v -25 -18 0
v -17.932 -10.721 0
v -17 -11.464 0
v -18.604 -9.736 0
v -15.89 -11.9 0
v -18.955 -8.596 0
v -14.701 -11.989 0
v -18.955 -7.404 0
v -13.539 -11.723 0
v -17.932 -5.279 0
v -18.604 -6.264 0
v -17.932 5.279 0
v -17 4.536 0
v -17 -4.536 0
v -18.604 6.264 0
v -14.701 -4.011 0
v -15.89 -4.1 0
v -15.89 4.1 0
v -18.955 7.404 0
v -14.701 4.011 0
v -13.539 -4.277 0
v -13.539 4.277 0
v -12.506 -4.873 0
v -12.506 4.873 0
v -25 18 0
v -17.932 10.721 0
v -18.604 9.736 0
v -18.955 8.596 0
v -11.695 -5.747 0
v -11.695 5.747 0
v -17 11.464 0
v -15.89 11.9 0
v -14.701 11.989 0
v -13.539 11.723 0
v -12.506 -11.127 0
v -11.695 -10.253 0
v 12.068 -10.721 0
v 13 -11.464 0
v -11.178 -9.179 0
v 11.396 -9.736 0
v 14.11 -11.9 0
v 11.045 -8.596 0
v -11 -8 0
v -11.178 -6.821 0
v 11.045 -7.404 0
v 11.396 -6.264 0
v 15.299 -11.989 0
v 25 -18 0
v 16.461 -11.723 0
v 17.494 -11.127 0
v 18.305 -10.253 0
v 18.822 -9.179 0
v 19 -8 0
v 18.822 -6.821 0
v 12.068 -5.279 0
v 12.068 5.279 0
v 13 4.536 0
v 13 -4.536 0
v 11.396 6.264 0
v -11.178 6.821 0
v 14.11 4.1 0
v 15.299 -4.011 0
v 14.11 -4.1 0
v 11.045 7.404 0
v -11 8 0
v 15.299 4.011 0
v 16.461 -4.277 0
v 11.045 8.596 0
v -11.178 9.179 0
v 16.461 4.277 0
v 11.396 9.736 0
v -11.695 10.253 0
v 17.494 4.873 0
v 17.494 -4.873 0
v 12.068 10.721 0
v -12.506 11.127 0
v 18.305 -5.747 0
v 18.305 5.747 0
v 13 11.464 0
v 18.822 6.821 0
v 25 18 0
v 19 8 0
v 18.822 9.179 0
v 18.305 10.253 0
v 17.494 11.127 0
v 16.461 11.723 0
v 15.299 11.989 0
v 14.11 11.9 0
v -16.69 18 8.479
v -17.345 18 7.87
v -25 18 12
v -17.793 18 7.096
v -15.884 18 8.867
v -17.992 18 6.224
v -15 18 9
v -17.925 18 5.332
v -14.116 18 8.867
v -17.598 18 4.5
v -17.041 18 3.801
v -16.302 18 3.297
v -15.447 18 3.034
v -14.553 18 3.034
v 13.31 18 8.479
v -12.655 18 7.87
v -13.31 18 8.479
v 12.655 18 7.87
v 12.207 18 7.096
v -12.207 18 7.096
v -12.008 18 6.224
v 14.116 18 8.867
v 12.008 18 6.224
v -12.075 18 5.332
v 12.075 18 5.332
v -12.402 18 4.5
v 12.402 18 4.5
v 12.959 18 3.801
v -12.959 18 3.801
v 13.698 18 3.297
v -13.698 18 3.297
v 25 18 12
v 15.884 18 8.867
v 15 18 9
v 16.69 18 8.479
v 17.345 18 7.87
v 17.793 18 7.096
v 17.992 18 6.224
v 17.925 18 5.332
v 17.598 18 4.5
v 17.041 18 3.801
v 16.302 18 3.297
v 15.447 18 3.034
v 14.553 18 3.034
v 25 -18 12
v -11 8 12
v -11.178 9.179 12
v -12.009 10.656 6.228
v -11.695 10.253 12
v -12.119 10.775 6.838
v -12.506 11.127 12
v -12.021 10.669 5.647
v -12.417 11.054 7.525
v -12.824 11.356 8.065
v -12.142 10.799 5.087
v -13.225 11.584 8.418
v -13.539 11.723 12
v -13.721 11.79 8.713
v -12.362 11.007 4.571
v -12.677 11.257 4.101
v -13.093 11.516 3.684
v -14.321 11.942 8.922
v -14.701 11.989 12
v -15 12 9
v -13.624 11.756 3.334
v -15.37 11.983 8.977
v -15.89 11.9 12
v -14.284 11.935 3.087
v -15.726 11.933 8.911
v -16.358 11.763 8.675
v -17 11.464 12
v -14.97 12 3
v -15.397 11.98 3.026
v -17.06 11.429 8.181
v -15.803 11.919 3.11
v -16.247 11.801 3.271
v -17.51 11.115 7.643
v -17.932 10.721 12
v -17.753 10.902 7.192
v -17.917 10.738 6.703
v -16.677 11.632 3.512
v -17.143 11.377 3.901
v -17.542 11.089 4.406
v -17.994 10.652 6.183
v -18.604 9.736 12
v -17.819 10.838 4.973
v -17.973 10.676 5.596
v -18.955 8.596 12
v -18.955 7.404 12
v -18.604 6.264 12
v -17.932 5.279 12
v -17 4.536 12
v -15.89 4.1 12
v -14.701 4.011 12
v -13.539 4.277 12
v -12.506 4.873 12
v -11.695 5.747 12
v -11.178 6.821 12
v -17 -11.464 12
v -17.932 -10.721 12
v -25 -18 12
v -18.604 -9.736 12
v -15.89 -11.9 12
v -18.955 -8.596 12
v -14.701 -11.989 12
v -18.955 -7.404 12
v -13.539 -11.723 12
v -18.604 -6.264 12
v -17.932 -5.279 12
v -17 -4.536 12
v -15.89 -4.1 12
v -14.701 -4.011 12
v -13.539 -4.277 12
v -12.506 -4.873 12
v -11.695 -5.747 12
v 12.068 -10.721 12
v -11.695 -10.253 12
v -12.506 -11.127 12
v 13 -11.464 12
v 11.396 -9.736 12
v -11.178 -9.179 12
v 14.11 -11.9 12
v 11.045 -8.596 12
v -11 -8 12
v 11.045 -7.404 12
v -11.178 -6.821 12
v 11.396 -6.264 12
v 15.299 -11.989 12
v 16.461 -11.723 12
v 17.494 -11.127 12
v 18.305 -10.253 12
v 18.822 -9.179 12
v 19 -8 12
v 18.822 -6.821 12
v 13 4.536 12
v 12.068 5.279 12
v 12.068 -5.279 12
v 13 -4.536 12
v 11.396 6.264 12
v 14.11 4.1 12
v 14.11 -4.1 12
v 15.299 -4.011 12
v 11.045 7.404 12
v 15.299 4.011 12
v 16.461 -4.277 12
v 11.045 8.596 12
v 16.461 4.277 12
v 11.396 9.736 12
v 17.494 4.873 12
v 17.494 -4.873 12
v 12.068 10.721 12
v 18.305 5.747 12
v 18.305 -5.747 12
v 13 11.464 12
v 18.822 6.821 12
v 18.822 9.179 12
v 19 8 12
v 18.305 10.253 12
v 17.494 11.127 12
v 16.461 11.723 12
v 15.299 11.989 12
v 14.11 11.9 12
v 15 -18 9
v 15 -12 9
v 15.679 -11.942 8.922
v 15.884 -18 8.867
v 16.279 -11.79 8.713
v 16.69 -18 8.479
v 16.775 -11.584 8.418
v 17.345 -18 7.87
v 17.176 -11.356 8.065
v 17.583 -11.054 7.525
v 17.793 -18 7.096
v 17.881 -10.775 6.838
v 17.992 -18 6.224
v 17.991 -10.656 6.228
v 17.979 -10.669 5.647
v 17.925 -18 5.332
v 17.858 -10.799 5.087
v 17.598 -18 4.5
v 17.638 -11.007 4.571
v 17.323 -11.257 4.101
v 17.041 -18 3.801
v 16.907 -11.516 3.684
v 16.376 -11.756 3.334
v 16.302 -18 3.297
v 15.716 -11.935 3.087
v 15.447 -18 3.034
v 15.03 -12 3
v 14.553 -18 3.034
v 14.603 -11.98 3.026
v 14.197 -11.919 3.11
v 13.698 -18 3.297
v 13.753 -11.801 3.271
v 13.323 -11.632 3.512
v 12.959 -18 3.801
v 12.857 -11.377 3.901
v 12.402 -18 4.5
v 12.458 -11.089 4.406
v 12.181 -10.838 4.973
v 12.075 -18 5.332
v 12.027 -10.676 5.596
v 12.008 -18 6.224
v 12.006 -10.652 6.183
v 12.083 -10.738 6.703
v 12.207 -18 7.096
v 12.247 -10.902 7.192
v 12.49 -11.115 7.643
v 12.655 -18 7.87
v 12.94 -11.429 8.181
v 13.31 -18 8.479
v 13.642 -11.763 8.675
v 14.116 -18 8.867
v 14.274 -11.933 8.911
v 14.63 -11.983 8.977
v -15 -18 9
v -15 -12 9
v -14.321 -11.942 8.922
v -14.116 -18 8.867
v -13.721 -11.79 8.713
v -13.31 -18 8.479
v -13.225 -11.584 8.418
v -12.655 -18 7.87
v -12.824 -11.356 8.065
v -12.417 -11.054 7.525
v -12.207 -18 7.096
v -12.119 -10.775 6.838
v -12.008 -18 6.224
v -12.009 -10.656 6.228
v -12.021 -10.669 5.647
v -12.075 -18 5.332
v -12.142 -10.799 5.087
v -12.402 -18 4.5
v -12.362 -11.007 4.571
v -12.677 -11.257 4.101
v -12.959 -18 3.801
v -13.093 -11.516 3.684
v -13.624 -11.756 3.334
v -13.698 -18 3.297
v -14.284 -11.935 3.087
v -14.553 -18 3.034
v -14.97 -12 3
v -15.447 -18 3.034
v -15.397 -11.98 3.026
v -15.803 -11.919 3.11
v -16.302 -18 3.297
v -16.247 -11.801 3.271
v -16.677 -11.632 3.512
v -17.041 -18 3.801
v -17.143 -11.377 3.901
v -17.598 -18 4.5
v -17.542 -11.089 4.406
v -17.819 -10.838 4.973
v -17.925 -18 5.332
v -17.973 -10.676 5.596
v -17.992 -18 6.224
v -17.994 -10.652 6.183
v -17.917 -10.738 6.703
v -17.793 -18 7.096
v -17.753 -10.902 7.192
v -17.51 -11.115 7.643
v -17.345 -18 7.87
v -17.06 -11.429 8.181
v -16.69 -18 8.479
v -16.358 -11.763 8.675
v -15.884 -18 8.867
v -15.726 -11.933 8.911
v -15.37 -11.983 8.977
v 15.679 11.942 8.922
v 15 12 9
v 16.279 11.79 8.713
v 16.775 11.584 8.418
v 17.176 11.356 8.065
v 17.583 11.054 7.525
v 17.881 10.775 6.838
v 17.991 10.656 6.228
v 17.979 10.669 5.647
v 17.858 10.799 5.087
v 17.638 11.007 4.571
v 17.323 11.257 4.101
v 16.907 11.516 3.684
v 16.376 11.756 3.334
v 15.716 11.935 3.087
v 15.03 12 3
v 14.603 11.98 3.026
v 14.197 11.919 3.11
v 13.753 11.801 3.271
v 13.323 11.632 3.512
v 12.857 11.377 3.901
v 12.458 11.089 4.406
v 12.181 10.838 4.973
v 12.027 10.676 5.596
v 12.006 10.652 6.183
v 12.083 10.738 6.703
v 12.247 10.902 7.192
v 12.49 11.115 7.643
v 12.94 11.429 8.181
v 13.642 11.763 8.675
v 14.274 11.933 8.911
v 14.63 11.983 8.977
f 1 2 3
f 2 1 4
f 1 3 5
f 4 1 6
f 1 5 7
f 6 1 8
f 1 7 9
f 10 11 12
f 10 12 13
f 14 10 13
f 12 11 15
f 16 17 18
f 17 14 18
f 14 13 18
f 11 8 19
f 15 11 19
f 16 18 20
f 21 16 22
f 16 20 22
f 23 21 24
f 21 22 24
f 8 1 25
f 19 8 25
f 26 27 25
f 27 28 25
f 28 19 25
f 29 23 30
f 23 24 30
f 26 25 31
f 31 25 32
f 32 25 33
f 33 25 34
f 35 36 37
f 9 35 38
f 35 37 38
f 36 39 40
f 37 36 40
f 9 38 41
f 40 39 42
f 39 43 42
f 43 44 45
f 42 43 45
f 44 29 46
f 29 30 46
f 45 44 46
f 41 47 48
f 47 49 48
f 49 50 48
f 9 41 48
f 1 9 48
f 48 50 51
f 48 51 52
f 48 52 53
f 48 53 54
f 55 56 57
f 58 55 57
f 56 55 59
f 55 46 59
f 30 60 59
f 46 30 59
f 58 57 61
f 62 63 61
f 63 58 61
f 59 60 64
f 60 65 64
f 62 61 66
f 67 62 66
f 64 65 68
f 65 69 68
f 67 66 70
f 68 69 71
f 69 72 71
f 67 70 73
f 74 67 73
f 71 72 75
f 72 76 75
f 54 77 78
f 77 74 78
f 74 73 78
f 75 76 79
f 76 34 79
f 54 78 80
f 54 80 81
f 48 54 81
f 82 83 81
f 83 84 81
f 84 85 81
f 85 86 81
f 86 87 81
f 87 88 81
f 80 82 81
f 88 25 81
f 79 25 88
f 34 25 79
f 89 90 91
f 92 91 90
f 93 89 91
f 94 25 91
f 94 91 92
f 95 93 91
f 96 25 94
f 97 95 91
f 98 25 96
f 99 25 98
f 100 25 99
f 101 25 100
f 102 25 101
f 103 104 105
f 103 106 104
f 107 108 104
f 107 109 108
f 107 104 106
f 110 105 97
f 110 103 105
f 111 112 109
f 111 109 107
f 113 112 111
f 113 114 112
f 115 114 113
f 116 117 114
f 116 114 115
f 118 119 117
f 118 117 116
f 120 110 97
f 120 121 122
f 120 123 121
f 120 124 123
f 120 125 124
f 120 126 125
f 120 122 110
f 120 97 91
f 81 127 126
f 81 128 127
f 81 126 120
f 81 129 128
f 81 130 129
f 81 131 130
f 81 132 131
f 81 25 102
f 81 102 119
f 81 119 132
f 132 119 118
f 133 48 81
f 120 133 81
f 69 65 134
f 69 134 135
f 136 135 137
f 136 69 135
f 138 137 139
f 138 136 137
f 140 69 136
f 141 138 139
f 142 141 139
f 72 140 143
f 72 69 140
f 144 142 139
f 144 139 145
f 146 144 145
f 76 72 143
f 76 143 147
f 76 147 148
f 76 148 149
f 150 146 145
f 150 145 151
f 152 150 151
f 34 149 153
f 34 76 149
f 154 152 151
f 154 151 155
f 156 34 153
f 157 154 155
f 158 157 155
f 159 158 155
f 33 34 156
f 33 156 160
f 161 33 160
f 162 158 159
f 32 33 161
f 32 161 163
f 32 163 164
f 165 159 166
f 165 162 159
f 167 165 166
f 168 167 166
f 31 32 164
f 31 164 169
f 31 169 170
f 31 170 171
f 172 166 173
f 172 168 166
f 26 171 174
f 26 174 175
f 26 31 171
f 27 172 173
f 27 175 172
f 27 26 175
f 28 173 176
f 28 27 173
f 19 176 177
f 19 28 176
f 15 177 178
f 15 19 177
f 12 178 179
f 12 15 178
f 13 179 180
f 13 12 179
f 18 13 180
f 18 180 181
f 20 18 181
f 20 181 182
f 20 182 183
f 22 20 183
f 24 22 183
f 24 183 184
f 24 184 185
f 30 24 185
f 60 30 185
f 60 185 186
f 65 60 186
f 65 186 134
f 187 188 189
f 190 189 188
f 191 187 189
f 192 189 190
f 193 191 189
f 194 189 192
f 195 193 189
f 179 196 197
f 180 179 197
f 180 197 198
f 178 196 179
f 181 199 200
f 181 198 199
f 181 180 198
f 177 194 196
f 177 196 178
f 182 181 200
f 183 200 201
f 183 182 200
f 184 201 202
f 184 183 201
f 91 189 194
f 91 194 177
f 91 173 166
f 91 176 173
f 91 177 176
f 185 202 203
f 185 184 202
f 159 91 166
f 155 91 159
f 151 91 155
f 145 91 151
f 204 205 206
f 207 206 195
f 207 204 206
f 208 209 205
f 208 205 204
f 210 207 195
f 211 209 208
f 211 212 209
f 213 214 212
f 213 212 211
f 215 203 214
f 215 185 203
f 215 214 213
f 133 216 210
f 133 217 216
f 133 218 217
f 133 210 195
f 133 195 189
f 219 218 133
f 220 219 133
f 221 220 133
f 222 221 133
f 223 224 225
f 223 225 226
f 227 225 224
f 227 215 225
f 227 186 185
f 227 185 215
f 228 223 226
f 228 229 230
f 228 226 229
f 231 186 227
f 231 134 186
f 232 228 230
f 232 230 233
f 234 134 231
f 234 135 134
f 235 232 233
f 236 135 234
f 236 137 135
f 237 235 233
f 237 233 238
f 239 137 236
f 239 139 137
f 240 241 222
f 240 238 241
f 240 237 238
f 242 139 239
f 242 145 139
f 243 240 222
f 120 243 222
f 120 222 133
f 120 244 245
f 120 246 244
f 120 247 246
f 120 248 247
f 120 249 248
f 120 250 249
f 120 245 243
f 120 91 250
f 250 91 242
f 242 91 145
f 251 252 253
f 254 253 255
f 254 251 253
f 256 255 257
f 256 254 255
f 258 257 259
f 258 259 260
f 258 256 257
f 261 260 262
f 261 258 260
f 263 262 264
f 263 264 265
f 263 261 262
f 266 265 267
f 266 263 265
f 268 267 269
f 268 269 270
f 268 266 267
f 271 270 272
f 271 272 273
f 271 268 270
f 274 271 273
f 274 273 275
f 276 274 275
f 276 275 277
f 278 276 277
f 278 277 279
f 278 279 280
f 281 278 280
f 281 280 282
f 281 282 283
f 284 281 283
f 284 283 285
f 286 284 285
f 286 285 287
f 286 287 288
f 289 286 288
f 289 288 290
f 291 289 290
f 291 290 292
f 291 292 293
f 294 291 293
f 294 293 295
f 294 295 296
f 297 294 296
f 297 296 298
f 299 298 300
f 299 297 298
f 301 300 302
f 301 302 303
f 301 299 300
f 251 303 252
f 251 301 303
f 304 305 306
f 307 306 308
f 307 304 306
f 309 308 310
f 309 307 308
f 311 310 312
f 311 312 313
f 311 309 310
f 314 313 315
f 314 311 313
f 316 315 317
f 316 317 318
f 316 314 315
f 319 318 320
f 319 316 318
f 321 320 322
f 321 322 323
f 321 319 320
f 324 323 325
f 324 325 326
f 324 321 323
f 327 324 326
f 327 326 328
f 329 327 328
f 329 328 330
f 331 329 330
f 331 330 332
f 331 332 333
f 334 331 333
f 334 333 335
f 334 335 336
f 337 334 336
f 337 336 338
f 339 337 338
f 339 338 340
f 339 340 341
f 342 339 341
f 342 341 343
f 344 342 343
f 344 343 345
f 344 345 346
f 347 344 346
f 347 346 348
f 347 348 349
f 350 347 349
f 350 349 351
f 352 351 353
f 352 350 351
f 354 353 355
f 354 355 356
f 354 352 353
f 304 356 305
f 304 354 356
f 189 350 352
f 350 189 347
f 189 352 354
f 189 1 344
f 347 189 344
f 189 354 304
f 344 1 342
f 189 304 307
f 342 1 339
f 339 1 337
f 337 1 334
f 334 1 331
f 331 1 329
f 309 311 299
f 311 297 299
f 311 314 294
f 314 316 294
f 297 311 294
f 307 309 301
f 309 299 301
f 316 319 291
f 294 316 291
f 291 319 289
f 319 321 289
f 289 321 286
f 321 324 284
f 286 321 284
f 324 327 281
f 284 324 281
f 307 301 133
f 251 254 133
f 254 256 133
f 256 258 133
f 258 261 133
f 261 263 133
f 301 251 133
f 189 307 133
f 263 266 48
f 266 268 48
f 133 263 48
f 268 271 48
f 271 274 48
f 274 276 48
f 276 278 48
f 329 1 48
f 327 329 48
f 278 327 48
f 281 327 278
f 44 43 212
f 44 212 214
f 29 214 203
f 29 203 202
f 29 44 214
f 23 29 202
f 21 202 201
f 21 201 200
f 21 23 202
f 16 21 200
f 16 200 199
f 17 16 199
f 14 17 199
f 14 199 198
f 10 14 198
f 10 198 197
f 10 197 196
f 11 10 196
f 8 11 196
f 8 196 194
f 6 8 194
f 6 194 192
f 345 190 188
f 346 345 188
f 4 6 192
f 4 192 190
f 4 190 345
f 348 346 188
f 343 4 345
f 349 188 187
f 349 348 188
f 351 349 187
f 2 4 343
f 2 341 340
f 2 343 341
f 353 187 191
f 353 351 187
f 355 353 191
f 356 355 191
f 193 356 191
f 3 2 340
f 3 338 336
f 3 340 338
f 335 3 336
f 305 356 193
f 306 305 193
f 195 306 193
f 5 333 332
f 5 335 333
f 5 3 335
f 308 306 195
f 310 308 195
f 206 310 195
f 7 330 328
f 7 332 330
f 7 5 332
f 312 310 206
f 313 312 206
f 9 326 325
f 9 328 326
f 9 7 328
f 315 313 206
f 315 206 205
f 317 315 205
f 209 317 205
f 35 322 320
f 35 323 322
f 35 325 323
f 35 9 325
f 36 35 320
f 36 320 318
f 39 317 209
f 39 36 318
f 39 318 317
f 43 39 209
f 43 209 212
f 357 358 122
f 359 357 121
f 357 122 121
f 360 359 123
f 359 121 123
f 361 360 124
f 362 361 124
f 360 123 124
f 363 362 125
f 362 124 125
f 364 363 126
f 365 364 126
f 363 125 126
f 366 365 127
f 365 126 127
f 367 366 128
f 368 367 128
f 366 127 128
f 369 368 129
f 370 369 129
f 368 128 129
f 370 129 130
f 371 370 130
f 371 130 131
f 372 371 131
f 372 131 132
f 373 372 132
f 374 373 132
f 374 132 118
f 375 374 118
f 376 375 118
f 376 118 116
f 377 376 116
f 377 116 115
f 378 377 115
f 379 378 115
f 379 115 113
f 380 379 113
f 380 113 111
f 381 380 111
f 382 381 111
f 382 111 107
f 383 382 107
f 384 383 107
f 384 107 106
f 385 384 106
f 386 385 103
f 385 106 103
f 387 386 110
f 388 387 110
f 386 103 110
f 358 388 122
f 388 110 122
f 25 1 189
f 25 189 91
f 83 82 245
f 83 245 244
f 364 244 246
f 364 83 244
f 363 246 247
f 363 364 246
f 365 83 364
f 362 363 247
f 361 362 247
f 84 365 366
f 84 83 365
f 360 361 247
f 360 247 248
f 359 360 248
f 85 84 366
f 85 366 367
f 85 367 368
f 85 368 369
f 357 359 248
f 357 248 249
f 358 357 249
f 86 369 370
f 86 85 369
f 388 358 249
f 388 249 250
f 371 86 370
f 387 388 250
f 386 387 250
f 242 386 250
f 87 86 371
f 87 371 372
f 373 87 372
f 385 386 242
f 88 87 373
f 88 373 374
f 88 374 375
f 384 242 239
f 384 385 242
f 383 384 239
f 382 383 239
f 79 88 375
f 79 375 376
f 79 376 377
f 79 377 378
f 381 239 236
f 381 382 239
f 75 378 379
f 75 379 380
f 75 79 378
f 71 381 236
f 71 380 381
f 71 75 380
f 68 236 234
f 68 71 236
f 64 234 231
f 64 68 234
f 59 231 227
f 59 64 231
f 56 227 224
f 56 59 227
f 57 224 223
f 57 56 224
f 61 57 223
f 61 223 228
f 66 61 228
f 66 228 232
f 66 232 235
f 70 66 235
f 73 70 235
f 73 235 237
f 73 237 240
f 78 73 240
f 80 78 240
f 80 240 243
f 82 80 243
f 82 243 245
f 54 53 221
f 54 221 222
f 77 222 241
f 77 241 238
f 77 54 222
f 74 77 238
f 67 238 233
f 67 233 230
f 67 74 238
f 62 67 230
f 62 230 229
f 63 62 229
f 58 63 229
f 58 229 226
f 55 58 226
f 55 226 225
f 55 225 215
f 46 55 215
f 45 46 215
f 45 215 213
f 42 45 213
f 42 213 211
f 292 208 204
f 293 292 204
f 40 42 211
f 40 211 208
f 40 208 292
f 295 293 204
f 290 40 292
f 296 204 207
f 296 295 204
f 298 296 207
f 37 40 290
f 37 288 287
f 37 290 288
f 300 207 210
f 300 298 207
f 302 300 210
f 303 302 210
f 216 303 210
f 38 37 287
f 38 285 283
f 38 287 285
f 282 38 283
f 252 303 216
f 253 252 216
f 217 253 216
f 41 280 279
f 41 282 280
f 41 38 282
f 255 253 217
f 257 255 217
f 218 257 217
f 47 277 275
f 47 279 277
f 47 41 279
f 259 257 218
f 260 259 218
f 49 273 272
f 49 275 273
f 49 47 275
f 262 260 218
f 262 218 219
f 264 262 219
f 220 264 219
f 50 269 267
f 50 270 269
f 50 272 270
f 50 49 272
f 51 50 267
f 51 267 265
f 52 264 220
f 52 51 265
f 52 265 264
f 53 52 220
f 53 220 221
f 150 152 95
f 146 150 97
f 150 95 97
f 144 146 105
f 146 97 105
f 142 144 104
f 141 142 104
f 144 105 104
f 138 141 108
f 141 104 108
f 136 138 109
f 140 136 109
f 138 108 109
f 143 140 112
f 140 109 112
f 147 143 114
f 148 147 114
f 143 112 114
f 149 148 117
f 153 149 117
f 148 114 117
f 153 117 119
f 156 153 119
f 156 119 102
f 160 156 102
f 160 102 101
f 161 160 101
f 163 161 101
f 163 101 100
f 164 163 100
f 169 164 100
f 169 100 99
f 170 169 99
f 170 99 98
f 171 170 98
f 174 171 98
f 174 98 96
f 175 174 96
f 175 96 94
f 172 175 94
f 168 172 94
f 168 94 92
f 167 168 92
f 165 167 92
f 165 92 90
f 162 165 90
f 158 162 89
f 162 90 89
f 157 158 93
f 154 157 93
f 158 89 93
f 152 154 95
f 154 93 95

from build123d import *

# Parameters (mm, degrees)
SKETCH1_W           = 50
SKETCH1_H           = 36
SKETCH1_R           = 4
BOSS_EXTRUDE1_DEPTH = 12
CUT_EXTRUDE1_REACH  = 47.442
SKETCH2_R           = 3


with BuildPart() as part:
    # Sketch1 → Boss-Extrude1 (new body)
    with BuildSketch(Plane.XY):
        Rectangle(SKETCH1_W, SKETCH1_H)
        with Locations((-15, 8)):
            Circle(SKETCH1_R, mode=Mode.SUBTRACT)
        with Locations((-15, -8)):
            Circle(SKETCH1_R, mode=Mode.SUBTRACT)
        with Locations((15, -8)):
            Circle(SKETCH1_R, mode=Mode.SUBTRACT)
        with Locations((15, 8)):
            Circle(SKETCH1_R, mode=Mode.SUBTRACT)
    extrude(amount=BOSS_EXTRUDE1_DEPTH)

    # Sketch2 → Cut-Extrude1 (cut, up to next)
    with BuildSketch(Plane(origin=(0, 18, 0), x_dir=(1, 0, 0), z_dir=(0, 1, 0)), mode=Mode.PRIVATE) as cut_extrude1_sk1:
        with Locations(Location((-15, -6, 0), (0, 0, 270))):
            Circle(SKETCH2_R)
    cut_extrude1_tool1 = extrude(cut_extrude1_sk1.sketch, amount=-CUT_EXTRUDE1_REACH, mode=Mode.PRIVATE) & part.part
    # Sketch2 → Cut-Extrude1 (cut, up to next)
    with BuildSketch(Plane(origin=(0, 18, 0), x_dir=(1, 0, 0), z_dir=(0, 1, 0)), mode=Mode.PRIVATE) as cut_extrude1_sk2:
        with Locations(Location((15, -6, 0), (0, 0, 270))):
            Circle(SKETCH2_R)
    cut_extrude1_tool2 = extrude(cut_extrude1_sk2.sketch, amount=-CUT_EXTRUDE1_REACH, mode=Mode.PRIVATE) & part.part
    cut_extrude1_1 = cut_extrude1_tool1.solids().sort_by_distance((-15, 18, 6))[0]
    add(cut_extrude1_1, mode=Mode.SUBTRACT)
    cut_extrude1_2 = cut_extrude1_tool2.solids().sort_by_distance((15, 18, 6))[0]
    add(cut_extrude1_2, mode=Mode.SUBTRACT)
    cut_extrude1 = cut_extrude1_1 + cut_extrude1_2  # Cut-Extrude1 as one shape, for the pattern or mirror that repeats it

    # Mirror1: Cut-Extrude1 across plane
    add(cut_extrude1.mirror(Plane.ZX), mode=Mode.SUBTRACT)


solid = part.part
